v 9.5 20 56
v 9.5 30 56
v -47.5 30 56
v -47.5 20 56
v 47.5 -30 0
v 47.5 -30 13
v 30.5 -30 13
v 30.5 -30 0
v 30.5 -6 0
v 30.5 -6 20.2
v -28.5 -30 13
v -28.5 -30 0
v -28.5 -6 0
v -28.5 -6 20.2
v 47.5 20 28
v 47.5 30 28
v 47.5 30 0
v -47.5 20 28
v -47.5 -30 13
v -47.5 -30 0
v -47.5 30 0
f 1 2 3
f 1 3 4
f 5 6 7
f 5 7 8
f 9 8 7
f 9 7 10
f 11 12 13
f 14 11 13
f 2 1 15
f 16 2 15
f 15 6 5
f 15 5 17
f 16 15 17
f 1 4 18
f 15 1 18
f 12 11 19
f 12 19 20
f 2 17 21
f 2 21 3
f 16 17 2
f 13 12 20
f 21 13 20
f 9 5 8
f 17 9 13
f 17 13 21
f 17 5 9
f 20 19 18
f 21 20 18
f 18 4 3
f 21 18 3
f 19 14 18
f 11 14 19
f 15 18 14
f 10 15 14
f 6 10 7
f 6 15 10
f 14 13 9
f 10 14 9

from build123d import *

# Parameters (mm, degrees)
F1_DEPTH = 47.5
F2_W     = 59
F2_H     = 24
F3_DEPTH = 25
F5_DEPTH = 10


with BuildPart() as f1:
    # F0 (on Right) → F1 (new body, symmetric)
    with BuildSketch(Plane.YZ):
        Polygon((-30, 13), (-30, 0), (30, 0), (30, 56), (20, 56), (20, 28), align=None)
    extrude(amount=F1_DEPTH, both=True)

    # F2 (on Top) → F3 (cut)
    with BuildSketch(Plane.XY):
        with Locations((1, -18)):
            Rectangle(F2_W, F2_H)
    extrude(amount=F3_DEPTH, mode=Mode.SUBTRACT)

    # F4 (on face) → F5 (cut, through all)
    with BuildSketch(Plane.XZ.offset(-20)):
        Polygon((47.5, 56), (9.5, 56), (47.5, 28), align=None)
    extrude(amount=-F5_DEPTH, mode=Mode.SUBTRACT)


solid = f1.part
